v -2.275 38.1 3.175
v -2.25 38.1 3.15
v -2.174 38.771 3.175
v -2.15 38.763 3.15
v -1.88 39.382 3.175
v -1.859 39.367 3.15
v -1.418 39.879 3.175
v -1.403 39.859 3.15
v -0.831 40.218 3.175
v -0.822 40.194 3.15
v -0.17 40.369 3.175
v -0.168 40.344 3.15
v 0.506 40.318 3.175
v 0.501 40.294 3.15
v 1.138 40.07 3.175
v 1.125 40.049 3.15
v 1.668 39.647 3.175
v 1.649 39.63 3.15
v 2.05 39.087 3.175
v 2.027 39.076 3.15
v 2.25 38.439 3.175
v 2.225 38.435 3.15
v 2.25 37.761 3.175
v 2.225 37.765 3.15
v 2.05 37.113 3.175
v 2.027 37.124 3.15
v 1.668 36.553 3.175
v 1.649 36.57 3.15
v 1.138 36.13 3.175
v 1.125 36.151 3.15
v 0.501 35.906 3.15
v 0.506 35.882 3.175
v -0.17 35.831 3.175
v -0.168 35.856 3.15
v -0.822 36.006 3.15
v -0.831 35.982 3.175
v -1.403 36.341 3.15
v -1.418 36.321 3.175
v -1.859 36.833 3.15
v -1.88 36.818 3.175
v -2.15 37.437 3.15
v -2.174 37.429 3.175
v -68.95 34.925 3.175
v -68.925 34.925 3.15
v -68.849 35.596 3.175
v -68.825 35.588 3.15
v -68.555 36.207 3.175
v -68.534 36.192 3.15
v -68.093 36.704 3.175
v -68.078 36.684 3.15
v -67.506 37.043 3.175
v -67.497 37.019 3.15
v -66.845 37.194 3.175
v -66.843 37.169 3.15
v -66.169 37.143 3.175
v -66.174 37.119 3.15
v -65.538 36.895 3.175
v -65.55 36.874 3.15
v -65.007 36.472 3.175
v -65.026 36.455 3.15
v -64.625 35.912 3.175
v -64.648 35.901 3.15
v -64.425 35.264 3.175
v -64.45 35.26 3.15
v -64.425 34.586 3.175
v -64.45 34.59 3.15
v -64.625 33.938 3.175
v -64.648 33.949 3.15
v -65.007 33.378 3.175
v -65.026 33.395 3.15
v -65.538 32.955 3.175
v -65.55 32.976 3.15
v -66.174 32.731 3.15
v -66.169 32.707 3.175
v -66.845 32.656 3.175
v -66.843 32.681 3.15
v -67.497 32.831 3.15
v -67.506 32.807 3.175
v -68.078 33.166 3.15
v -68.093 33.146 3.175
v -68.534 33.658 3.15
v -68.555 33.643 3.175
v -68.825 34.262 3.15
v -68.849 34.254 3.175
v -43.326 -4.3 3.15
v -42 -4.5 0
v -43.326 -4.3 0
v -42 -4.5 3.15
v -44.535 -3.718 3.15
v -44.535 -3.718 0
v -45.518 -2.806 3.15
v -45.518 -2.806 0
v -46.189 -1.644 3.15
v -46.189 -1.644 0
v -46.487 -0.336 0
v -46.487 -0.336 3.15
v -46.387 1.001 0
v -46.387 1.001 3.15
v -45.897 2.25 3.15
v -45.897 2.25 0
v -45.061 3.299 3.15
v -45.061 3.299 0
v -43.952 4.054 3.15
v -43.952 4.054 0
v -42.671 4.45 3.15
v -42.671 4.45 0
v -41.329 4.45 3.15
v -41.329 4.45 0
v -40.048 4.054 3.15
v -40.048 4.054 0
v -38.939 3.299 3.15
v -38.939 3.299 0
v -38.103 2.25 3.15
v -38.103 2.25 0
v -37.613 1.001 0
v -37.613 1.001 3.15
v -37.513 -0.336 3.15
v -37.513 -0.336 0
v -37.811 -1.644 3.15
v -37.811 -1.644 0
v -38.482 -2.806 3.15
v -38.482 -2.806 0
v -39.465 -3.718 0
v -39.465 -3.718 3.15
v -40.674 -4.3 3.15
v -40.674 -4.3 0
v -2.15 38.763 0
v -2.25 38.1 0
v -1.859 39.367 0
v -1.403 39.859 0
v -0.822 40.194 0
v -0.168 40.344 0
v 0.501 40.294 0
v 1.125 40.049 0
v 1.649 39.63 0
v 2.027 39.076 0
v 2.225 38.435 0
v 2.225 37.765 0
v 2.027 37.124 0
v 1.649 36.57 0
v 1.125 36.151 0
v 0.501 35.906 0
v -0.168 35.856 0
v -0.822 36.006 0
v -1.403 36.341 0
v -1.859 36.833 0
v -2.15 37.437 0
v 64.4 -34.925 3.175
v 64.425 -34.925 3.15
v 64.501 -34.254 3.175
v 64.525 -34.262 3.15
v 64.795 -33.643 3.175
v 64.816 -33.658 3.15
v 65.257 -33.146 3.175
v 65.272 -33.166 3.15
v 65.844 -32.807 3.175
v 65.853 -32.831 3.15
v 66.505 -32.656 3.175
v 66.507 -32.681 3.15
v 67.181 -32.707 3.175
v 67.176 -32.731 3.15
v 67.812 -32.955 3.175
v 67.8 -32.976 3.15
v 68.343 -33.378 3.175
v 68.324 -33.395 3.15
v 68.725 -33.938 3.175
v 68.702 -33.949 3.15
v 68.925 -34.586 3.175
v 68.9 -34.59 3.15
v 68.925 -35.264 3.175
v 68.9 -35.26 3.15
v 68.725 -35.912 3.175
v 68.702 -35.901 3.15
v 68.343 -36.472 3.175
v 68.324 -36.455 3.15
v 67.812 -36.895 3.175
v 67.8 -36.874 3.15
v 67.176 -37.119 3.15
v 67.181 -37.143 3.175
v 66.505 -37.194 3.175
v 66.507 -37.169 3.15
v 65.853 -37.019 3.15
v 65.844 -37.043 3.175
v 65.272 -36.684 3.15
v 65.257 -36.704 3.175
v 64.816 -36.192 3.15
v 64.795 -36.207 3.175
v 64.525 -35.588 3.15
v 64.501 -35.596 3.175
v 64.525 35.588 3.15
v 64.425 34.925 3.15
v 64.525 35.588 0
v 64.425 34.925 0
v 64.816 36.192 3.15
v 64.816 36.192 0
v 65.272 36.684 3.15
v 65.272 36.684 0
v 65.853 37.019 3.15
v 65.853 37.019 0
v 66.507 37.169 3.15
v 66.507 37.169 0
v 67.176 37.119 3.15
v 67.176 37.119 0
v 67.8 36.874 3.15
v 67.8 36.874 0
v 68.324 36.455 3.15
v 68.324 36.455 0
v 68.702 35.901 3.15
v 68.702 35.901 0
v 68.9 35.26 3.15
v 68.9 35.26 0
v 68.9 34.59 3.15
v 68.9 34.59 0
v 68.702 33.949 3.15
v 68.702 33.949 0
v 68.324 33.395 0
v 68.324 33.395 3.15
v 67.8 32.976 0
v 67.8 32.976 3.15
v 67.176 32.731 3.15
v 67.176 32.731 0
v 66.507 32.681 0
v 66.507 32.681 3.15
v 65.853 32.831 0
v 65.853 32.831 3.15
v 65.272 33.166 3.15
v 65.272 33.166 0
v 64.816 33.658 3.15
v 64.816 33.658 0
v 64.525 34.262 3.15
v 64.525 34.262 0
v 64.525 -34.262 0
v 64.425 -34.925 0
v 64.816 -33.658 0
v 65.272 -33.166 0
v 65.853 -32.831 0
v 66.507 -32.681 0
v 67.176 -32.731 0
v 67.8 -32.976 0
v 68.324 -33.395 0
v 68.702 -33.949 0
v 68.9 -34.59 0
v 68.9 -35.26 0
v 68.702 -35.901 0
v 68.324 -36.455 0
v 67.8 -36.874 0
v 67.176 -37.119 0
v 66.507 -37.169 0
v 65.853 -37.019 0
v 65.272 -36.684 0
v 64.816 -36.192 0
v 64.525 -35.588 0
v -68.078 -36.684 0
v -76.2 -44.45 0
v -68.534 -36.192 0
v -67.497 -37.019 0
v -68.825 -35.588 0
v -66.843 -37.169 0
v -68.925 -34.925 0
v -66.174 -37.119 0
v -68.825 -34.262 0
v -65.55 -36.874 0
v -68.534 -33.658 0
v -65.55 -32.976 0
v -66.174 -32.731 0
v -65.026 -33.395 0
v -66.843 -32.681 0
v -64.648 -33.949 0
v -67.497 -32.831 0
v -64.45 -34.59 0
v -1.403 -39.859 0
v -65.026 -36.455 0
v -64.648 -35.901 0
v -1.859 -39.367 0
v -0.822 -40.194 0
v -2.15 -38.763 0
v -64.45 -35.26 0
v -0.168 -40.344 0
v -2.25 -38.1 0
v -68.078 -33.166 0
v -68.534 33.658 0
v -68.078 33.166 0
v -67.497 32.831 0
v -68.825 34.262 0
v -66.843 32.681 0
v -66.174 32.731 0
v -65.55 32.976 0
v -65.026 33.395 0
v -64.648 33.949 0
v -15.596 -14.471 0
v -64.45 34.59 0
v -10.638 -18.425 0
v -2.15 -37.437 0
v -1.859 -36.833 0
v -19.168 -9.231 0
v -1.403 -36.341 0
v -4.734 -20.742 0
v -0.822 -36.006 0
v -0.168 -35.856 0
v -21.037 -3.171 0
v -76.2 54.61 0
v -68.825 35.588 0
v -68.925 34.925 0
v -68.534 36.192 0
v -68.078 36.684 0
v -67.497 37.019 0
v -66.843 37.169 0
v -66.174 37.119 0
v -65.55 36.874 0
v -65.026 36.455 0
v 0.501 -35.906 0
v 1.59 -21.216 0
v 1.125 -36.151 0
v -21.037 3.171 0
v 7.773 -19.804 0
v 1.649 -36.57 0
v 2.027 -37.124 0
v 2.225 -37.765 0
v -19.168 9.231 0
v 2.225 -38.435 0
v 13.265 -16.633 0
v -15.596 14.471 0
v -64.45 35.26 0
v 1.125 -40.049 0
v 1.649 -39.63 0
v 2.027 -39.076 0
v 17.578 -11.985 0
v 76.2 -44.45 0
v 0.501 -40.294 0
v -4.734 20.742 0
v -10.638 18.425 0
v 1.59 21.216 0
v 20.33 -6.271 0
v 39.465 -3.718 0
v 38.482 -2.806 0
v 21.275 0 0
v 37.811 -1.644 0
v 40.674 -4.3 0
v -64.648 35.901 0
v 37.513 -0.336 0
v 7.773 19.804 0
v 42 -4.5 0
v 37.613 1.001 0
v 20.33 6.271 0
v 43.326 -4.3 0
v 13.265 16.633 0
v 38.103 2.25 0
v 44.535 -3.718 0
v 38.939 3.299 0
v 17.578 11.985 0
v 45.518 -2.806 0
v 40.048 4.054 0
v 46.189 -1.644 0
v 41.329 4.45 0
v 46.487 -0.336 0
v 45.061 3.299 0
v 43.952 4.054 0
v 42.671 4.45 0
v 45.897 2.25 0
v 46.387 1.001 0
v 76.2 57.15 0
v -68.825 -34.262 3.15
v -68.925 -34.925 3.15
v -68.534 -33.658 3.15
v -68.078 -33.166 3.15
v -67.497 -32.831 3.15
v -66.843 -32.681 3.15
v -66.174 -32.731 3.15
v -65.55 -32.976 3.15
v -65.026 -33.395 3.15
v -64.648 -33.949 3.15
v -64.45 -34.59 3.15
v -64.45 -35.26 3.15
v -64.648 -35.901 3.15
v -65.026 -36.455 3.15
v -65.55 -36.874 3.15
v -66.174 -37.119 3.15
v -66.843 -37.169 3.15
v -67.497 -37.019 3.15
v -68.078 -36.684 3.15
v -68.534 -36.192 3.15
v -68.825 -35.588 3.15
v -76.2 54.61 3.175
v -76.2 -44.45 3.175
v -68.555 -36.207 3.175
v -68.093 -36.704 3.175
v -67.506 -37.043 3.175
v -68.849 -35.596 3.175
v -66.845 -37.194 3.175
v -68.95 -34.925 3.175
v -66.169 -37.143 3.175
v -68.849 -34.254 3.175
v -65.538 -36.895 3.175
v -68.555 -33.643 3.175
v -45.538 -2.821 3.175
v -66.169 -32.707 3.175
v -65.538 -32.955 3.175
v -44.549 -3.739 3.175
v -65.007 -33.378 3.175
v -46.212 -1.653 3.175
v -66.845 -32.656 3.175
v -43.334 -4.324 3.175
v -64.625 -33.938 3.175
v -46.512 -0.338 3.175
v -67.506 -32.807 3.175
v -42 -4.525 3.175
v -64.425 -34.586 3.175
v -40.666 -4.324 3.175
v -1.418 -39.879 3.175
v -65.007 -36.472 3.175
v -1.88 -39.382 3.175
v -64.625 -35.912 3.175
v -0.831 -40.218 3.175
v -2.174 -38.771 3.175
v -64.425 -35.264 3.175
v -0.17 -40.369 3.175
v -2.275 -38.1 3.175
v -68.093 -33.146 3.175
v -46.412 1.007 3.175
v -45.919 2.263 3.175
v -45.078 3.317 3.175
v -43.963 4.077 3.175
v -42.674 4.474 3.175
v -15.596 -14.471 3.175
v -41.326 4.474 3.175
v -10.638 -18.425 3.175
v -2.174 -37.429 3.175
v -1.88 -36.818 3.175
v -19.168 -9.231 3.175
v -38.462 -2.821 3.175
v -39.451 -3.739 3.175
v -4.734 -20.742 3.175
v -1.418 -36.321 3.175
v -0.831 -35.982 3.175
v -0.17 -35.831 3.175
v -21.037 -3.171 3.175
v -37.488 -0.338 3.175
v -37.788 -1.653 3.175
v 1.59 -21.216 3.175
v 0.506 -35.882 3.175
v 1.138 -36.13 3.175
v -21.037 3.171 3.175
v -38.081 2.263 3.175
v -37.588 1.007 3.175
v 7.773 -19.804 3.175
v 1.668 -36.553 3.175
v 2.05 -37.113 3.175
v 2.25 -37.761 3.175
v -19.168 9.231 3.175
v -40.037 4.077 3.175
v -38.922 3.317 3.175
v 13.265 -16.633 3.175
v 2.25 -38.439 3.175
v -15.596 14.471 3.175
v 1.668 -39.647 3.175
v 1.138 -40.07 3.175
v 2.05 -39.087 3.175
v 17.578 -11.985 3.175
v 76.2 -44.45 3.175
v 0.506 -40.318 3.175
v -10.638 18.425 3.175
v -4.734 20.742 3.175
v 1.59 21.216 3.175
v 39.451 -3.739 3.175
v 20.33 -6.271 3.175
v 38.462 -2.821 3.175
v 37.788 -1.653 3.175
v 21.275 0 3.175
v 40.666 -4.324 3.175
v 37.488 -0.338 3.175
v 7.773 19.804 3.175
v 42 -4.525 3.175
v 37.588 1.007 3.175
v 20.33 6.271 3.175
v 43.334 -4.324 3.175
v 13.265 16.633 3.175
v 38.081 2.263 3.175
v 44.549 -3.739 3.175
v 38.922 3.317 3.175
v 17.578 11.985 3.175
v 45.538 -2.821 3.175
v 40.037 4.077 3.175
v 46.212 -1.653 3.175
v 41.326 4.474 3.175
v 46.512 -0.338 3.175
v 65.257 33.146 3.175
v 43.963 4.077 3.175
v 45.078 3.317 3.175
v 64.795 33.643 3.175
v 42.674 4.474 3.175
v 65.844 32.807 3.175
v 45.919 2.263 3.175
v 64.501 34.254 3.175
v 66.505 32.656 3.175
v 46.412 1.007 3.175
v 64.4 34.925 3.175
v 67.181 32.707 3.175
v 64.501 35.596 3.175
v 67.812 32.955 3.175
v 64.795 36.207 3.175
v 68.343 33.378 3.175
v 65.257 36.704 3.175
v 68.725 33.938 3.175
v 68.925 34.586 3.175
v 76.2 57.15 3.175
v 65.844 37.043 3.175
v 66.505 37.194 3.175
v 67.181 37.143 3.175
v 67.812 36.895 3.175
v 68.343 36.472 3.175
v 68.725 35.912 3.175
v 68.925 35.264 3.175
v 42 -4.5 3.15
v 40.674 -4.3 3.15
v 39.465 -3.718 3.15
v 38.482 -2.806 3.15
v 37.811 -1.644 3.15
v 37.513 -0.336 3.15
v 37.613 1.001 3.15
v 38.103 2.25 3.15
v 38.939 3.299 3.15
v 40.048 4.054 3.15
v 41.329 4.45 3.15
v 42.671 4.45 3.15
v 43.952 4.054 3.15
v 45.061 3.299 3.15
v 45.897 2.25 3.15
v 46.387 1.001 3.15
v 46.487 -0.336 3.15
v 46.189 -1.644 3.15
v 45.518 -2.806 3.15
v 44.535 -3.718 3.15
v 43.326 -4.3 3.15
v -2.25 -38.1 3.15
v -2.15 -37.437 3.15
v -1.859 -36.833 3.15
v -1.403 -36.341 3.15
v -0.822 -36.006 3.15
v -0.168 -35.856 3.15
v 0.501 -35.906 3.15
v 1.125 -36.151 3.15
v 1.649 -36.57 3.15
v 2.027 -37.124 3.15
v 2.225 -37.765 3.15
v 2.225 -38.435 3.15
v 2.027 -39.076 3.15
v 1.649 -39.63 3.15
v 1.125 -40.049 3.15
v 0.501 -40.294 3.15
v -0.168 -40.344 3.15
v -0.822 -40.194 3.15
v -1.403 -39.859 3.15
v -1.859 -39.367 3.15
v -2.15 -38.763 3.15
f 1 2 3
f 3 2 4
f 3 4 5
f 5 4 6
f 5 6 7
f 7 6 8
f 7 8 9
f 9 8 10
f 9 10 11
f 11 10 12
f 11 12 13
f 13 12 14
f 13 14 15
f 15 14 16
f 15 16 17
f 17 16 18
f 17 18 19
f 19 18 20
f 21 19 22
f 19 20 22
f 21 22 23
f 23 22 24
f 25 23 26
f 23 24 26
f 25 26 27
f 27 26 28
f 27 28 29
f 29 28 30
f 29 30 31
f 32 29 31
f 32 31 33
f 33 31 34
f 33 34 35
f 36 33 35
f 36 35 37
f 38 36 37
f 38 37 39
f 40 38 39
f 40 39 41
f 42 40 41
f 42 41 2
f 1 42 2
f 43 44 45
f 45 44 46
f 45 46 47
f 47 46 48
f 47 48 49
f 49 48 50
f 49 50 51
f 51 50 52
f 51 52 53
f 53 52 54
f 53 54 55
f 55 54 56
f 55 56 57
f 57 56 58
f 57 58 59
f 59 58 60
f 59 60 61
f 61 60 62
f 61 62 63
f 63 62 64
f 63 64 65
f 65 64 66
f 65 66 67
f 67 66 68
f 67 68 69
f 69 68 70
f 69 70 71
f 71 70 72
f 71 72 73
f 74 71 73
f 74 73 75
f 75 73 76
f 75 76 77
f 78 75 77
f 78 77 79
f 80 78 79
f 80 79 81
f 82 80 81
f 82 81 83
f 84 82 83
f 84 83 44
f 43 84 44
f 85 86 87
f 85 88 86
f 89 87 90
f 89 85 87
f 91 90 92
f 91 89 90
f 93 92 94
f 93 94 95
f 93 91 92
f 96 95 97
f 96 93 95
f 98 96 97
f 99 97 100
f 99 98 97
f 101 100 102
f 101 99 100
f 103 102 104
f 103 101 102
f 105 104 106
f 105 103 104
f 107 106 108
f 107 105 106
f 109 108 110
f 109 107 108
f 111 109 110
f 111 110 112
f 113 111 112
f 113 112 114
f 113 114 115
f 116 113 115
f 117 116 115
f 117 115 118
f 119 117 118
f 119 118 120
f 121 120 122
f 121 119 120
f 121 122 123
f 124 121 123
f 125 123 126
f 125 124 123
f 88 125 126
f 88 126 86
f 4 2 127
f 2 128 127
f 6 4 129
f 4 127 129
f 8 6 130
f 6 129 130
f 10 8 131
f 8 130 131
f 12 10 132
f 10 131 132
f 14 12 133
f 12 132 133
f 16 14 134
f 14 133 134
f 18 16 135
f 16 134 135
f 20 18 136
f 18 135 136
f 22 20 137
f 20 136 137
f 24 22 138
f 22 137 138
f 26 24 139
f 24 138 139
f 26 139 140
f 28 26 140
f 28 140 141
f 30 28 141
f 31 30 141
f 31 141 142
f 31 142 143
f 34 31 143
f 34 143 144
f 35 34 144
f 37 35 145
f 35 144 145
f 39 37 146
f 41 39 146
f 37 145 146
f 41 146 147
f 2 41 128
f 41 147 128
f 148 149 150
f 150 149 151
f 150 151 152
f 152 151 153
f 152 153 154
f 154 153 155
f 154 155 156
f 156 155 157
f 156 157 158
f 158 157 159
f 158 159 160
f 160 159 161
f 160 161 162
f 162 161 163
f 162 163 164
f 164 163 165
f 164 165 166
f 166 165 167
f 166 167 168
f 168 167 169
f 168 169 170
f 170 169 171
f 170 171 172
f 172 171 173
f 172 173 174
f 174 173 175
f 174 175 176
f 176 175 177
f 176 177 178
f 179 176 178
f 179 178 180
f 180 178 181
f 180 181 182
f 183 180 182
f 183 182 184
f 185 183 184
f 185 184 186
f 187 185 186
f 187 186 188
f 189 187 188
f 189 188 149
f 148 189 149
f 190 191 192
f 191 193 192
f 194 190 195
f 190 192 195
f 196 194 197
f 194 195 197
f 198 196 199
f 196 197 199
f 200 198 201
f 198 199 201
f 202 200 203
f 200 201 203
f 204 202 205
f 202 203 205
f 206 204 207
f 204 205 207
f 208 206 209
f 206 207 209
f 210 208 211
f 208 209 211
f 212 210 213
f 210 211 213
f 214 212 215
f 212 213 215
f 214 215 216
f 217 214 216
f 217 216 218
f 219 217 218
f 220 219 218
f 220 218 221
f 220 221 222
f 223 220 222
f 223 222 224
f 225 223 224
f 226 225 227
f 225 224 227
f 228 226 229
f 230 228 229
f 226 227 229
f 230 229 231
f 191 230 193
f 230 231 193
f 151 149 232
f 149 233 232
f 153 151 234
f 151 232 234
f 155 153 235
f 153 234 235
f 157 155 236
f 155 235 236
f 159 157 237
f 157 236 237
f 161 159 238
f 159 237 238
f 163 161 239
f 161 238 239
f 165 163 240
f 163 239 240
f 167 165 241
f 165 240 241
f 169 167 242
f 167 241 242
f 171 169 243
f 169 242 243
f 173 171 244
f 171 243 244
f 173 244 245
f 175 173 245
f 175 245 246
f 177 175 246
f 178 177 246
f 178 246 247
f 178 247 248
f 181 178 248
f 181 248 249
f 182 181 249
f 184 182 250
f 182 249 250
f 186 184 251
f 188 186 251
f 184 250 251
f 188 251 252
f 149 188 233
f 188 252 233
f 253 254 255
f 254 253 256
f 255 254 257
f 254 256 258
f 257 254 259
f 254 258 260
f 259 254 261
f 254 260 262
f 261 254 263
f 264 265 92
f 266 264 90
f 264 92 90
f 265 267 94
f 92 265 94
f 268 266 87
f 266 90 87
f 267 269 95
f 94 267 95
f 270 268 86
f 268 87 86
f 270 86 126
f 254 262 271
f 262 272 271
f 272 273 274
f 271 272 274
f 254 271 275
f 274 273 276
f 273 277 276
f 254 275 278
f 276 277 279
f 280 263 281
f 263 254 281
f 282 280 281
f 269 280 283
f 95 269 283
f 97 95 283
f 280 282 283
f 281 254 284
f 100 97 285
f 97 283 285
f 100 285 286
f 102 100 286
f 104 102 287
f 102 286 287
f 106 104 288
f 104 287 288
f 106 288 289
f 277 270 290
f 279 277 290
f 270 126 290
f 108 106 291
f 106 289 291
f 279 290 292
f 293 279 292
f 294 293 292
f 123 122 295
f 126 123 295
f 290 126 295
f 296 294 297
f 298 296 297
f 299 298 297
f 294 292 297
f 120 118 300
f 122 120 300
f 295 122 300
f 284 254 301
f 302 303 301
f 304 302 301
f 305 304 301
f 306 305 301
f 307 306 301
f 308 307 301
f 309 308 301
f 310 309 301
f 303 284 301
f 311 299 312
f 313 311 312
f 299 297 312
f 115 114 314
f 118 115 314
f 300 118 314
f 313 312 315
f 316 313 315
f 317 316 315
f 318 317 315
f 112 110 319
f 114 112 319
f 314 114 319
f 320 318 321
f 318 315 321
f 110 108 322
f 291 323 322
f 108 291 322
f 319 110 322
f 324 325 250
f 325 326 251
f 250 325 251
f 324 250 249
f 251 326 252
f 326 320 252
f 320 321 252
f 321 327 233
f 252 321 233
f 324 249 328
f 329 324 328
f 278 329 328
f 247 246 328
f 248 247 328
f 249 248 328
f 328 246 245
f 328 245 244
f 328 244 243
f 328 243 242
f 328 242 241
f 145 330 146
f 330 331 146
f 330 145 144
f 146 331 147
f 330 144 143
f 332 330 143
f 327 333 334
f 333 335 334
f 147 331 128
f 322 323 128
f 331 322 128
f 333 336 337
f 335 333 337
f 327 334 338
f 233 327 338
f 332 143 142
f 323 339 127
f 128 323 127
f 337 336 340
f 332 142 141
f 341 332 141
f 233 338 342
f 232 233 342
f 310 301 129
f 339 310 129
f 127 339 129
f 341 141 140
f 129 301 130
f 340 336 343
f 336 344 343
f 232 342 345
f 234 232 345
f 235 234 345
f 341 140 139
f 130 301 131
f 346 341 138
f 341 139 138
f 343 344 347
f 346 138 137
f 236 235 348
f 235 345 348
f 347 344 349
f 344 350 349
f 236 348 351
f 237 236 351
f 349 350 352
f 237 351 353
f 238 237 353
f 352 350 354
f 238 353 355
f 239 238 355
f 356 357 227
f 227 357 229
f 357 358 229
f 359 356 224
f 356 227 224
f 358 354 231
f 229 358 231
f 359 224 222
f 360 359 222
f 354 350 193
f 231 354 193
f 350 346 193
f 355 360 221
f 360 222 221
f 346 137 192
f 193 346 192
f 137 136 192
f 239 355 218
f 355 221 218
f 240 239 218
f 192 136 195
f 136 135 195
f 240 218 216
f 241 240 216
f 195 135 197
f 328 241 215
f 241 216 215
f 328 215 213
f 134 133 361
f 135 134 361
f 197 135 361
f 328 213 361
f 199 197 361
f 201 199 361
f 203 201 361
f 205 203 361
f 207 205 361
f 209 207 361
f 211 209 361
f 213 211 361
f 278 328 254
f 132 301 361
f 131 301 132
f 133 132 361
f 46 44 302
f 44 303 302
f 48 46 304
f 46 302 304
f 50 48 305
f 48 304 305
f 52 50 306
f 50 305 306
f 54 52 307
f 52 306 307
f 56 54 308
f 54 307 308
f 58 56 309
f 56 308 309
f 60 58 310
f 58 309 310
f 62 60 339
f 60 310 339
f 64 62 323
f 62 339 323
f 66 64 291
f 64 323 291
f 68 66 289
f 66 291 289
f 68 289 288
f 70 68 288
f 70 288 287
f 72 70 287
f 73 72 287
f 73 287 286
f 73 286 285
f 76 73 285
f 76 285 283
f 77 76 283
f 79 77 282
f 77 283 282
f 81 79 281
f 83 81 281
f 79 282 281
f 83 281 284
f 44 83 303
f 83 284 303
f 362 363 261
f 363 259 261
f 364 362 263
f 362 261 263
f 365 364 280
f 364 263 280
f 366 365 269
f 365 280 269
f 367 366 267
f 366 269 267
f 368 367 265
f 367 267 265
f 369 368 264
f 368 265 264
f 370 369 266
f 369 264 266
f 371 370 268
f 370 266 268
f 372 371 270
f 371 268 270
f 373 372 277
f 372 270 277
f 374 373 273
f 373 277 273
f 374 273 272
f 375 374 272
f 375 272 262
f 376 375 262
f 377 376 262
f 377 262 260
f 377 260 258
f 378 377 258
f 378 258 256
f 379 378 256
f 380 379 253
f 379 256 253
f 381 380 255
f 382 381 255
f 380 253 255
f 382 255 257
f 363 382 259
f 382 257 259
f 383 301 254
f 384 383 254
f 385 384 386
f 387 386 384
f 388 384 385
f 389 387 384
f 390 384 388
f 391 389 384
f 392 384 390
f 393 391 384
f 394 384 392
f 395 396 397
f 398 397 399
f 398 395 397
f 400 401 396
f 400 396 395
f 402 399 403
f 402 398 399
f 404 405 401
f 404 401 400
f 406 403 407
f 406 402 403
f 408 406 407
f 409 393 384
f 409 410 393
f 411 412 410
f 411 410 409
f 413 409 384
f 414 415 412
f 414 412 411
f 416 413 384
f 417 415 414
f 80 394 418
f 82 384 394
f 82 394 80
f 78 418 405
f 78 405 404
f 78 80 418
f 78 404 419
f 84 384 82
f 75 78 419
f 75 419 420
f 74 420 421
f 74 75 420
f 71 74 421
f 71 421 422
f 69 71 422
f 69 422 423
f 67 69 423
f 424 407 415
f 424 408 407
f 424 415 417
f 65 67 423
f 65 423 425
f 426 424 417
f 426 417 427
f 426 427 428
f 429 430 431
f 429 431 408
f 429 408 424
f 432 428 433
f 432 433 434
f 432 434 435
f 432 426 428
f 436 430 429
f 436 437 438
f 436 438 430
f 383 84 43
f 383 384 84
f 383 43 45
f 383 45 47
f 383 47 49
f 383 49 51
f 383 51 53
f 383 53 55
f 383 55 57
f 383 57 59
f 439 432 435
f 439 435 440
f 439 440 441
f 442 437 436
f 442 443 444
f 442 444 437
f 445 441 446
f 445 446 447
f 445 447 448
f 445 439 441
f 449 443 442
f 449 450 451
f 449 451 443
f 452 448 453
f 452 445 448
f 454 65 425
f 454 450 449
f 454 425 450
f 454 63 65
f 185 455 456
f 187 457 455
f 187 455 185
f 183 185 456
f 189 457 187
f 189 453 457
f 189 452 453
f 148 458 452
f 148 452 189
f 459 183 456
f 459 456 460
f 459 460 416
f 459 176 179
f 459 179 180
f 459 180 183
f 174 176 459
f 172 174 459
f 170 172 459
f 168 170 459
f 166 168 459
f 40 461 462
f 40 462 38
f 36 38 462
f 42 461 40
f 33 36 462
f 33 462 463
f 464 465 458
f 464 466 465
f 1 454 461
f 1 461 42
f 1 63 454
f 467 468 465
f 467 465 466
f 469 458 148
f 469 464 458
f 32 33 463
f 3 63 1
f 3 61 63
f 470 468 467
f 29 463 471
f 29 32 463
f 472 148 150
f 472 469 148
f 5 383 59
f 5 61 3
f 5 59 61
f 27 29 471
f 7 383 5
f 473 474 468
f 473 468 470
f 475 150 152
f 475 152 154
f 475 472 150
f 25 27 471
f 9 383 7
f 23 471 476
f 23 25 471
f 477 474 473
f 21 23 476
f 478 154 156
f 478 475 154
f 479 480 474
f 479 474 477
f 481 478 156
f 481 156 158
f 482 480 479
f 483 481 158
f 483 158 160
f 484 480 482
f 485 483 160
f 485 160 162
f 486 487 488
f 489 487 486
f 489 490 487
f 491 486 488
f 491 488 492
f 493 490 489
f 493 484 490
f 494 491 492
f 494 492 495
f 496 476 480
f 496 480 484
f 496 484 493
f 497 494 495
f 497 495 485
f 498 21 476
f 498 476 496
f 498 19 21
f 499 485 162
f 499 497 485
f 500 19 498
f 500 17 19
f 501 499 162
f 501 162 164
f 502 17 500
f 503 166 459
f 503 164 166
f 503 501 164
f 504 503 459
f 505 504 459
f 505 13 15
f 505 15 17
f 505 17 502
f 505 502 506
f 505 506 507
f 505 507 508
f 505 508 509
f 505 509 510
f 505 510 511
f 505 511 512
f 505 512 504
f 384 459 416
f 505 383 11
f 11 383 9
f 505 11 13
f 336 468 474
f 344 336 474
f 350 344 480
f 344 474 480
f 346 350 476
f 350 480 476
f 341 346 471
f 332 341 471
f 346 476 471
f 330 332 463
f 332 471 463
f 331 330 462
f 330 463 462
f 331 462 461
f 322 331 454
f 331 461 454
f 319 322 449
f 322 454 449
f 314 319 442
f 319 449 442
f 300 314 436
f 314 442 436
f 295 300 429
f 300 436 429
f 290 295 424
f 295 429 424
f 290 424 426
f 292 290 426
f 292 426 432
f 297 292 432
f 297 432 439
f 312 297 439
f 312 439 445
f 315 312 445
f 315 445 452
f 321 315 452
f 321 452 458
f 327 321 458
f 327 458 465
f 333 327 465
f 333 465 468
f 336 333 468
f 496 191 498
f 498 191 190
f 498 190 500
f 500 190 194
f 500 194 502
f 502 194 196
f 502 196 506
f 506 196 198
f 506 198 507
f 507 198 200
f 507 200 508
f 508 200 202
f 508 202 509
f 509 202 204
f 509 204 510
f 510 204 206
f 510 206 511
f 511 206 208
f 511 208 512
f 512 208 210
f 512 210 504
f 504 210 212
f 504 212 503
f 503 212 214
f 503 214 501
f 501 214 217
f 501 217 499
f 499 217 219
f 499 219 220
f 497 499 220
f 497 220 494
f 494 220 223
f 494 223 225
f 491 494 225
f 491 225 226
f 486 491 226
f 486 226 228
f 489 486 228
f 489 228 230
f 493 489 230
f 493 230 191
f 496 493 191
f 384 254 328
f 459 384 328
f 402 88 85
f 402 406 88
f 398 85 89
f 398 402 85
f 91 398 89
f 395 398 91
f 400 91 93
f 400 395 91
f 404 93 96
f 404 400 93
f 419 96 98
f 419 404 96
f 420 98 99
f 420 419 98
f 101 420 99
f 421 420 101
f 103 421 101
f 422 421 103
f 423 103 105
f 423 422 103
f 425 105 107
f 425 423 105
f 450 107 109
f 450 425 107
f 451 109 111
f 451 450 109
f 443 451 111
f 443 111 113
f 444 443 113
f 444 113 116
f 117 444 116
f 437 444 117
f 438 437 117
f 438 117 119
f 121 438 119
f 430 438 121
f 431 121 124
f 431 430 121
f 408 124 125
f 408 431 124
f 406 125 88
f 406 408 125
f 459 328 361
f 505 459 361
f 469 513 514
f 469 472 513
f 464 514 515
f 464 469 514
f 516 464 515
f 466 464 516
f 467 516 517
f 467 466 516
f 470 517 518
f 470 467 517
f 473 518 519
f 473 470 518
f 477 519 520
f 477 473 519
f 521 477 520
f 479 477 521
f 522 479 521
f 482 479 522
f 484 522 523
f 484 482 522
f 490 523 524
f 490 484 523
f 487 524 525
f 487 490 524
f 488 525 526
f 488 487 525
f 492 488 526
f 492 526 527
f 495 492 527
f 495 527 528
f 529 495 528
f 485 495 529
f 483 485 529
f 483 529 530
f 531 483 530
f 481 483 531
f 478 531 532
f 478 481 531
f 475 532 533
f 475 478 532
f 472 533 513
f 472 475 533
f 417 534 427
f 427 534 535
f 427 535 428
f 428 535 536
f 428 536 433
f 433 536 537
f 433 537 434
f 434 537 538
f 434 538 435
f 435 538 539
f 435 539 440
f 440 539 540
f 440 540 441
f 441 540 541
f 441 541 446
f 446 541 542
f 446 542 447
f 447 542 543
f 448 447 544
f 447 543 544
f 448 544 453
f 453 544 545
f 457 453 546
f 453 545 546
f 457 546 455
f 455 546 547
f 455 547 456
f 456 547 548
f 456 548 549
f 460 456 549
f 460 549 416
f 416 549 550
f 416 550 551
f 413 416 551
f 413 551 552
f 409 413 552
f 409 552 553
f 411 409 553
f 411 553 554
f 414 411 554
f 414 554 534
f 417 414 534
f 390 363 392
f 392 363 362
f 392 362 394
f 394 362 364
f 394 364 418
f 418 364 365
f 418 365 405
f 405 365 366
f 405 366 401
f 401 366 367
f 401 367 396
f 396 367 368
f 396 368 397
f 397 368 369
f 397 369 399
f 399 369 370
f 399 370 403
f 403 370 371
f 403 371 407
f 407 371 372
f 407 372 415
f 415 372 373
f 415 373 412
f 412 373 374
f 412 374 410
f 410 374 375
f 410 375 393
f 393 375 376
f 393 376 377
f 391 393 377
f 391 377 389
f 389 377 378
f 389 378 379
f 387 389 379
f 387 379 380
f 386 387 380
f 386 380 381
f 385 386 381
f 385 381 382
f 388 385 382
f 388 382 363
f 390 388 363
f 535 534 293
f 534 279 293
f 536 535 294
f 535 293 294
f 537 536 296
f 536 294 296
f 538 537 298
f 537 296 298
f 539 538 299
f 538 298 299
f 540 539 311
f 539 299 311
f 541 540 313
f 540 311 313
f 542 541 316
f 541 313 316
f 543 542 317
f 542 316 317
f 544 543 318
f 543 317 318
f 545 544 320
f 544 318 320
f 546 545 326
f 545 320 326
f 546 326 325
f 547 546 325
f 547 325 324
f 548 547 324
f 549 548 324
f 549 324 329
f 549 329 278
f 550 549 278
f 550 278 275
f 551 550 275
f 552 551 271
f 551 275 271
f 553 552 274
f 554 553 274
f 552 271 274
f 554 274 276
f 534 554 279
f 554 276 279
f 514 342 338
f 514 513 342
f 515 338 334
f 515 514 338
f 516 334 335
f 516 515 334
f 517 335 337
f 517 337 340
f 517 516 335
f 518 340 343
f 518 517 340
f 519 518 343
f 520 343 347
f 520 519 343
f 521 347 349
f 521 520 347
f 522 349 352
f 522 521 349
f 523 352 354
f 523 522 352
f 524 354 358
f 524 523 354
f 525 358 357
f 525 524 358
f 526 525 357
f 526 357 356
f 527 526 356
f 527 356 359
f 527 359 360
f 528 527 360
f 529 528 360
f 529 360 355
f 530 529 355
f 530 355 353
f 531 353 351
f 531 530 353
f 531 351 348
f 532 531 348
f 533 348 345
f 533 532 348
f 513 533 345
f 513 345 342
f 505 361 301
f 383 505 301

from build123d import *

# Parameters (mm, degrees)
BOSS_EXTRUDE1_DEPTH            = 3.175
M4_CLEARANCE_HOLE1_D           = 4.5
M4_CLEARANCE_HOLE1_CSINK_D     = 4.55
M4_CLEARANCE_HOLE1_CSINK_ANGLE = 90
M8_CLEARANCE_HOLE1_AT_2_COUNT  = 2
M8_CLEARANCE_HOLE1_AT_2_PITCH  = 84
SKETCH9_R                      = 21.275
CENTER_HOLE_DEPTH              = 96.302901976


with BuildPart() as part:
    # Sketch1 → Boss-Extrude1 (new body)
    with BuildSketch(Plane.XY):
        Polygon((-76.2, 54.61), (-76.2, 44.45), (-76.2, -44.45), (76.2, -44.45), (76.2, 44.45), (76.2, 57.15), align=None)
    extrude(amount=BOSS_EXTRUDE1_DEPTH)

    # M4 Clearance Hole1 (through all)
    with Locations(Plane.XY.offset(3.175)):
        with Locations((0, 38.1), (-66.675, 34.925), (-66.675, -34.925), (0, -38.1), (66.675, -34.925), (66.675, 34.925)):
            CounterSinkHole(M4_CLEARANCE_HOLE1_D / 2, M4_CLEARANCE_HOLE1_CSINK_D / 2, counter_sink_angle=M4_CLEARANCE_HOLE1_CSINK_ANGLE)

    # Sketch11 → M8 Clearance Hole1 (revolve, cut)
    with BuildSketch(Plane(origin=(-42, 0, 3.175), x_dir=(0, -1, 0), z_dir=(1, 0, 0))):
        Polygon((0, 0), (0, 3.175), (4.5, 3.175), (4.5, 0.025), (4.525, 0), align=None)
    m8_clearance_hole1 = revolve(axis=Axis((-42, 0, 9.525), (0, 0, -1)), mode=Mode.SUBTRACT)

    # M8 Clearance Hole1 at 2: M8 Clearance Hole1 ×2
    with Locations(*[(i * M8_CLEARANCE_HOLE1_AT_2_PITCH, 0, 0) for i in range(1, M8_CLEARANCE_HOLE1_AT_2_COUNT)]):
        add(m8_clearance_hole1, mode=Mode.SUBTRACT)

    # Sketch9 → Center Hole (cut, through all)
    with BuildSketch(Plane.XY.offset(3.175)):
        Circle(SKETCH9_R)
    extrude(amount=-CENTER_HOLE_DEPTH, mode=Mode.SUBTRACT)


solid = part.part
